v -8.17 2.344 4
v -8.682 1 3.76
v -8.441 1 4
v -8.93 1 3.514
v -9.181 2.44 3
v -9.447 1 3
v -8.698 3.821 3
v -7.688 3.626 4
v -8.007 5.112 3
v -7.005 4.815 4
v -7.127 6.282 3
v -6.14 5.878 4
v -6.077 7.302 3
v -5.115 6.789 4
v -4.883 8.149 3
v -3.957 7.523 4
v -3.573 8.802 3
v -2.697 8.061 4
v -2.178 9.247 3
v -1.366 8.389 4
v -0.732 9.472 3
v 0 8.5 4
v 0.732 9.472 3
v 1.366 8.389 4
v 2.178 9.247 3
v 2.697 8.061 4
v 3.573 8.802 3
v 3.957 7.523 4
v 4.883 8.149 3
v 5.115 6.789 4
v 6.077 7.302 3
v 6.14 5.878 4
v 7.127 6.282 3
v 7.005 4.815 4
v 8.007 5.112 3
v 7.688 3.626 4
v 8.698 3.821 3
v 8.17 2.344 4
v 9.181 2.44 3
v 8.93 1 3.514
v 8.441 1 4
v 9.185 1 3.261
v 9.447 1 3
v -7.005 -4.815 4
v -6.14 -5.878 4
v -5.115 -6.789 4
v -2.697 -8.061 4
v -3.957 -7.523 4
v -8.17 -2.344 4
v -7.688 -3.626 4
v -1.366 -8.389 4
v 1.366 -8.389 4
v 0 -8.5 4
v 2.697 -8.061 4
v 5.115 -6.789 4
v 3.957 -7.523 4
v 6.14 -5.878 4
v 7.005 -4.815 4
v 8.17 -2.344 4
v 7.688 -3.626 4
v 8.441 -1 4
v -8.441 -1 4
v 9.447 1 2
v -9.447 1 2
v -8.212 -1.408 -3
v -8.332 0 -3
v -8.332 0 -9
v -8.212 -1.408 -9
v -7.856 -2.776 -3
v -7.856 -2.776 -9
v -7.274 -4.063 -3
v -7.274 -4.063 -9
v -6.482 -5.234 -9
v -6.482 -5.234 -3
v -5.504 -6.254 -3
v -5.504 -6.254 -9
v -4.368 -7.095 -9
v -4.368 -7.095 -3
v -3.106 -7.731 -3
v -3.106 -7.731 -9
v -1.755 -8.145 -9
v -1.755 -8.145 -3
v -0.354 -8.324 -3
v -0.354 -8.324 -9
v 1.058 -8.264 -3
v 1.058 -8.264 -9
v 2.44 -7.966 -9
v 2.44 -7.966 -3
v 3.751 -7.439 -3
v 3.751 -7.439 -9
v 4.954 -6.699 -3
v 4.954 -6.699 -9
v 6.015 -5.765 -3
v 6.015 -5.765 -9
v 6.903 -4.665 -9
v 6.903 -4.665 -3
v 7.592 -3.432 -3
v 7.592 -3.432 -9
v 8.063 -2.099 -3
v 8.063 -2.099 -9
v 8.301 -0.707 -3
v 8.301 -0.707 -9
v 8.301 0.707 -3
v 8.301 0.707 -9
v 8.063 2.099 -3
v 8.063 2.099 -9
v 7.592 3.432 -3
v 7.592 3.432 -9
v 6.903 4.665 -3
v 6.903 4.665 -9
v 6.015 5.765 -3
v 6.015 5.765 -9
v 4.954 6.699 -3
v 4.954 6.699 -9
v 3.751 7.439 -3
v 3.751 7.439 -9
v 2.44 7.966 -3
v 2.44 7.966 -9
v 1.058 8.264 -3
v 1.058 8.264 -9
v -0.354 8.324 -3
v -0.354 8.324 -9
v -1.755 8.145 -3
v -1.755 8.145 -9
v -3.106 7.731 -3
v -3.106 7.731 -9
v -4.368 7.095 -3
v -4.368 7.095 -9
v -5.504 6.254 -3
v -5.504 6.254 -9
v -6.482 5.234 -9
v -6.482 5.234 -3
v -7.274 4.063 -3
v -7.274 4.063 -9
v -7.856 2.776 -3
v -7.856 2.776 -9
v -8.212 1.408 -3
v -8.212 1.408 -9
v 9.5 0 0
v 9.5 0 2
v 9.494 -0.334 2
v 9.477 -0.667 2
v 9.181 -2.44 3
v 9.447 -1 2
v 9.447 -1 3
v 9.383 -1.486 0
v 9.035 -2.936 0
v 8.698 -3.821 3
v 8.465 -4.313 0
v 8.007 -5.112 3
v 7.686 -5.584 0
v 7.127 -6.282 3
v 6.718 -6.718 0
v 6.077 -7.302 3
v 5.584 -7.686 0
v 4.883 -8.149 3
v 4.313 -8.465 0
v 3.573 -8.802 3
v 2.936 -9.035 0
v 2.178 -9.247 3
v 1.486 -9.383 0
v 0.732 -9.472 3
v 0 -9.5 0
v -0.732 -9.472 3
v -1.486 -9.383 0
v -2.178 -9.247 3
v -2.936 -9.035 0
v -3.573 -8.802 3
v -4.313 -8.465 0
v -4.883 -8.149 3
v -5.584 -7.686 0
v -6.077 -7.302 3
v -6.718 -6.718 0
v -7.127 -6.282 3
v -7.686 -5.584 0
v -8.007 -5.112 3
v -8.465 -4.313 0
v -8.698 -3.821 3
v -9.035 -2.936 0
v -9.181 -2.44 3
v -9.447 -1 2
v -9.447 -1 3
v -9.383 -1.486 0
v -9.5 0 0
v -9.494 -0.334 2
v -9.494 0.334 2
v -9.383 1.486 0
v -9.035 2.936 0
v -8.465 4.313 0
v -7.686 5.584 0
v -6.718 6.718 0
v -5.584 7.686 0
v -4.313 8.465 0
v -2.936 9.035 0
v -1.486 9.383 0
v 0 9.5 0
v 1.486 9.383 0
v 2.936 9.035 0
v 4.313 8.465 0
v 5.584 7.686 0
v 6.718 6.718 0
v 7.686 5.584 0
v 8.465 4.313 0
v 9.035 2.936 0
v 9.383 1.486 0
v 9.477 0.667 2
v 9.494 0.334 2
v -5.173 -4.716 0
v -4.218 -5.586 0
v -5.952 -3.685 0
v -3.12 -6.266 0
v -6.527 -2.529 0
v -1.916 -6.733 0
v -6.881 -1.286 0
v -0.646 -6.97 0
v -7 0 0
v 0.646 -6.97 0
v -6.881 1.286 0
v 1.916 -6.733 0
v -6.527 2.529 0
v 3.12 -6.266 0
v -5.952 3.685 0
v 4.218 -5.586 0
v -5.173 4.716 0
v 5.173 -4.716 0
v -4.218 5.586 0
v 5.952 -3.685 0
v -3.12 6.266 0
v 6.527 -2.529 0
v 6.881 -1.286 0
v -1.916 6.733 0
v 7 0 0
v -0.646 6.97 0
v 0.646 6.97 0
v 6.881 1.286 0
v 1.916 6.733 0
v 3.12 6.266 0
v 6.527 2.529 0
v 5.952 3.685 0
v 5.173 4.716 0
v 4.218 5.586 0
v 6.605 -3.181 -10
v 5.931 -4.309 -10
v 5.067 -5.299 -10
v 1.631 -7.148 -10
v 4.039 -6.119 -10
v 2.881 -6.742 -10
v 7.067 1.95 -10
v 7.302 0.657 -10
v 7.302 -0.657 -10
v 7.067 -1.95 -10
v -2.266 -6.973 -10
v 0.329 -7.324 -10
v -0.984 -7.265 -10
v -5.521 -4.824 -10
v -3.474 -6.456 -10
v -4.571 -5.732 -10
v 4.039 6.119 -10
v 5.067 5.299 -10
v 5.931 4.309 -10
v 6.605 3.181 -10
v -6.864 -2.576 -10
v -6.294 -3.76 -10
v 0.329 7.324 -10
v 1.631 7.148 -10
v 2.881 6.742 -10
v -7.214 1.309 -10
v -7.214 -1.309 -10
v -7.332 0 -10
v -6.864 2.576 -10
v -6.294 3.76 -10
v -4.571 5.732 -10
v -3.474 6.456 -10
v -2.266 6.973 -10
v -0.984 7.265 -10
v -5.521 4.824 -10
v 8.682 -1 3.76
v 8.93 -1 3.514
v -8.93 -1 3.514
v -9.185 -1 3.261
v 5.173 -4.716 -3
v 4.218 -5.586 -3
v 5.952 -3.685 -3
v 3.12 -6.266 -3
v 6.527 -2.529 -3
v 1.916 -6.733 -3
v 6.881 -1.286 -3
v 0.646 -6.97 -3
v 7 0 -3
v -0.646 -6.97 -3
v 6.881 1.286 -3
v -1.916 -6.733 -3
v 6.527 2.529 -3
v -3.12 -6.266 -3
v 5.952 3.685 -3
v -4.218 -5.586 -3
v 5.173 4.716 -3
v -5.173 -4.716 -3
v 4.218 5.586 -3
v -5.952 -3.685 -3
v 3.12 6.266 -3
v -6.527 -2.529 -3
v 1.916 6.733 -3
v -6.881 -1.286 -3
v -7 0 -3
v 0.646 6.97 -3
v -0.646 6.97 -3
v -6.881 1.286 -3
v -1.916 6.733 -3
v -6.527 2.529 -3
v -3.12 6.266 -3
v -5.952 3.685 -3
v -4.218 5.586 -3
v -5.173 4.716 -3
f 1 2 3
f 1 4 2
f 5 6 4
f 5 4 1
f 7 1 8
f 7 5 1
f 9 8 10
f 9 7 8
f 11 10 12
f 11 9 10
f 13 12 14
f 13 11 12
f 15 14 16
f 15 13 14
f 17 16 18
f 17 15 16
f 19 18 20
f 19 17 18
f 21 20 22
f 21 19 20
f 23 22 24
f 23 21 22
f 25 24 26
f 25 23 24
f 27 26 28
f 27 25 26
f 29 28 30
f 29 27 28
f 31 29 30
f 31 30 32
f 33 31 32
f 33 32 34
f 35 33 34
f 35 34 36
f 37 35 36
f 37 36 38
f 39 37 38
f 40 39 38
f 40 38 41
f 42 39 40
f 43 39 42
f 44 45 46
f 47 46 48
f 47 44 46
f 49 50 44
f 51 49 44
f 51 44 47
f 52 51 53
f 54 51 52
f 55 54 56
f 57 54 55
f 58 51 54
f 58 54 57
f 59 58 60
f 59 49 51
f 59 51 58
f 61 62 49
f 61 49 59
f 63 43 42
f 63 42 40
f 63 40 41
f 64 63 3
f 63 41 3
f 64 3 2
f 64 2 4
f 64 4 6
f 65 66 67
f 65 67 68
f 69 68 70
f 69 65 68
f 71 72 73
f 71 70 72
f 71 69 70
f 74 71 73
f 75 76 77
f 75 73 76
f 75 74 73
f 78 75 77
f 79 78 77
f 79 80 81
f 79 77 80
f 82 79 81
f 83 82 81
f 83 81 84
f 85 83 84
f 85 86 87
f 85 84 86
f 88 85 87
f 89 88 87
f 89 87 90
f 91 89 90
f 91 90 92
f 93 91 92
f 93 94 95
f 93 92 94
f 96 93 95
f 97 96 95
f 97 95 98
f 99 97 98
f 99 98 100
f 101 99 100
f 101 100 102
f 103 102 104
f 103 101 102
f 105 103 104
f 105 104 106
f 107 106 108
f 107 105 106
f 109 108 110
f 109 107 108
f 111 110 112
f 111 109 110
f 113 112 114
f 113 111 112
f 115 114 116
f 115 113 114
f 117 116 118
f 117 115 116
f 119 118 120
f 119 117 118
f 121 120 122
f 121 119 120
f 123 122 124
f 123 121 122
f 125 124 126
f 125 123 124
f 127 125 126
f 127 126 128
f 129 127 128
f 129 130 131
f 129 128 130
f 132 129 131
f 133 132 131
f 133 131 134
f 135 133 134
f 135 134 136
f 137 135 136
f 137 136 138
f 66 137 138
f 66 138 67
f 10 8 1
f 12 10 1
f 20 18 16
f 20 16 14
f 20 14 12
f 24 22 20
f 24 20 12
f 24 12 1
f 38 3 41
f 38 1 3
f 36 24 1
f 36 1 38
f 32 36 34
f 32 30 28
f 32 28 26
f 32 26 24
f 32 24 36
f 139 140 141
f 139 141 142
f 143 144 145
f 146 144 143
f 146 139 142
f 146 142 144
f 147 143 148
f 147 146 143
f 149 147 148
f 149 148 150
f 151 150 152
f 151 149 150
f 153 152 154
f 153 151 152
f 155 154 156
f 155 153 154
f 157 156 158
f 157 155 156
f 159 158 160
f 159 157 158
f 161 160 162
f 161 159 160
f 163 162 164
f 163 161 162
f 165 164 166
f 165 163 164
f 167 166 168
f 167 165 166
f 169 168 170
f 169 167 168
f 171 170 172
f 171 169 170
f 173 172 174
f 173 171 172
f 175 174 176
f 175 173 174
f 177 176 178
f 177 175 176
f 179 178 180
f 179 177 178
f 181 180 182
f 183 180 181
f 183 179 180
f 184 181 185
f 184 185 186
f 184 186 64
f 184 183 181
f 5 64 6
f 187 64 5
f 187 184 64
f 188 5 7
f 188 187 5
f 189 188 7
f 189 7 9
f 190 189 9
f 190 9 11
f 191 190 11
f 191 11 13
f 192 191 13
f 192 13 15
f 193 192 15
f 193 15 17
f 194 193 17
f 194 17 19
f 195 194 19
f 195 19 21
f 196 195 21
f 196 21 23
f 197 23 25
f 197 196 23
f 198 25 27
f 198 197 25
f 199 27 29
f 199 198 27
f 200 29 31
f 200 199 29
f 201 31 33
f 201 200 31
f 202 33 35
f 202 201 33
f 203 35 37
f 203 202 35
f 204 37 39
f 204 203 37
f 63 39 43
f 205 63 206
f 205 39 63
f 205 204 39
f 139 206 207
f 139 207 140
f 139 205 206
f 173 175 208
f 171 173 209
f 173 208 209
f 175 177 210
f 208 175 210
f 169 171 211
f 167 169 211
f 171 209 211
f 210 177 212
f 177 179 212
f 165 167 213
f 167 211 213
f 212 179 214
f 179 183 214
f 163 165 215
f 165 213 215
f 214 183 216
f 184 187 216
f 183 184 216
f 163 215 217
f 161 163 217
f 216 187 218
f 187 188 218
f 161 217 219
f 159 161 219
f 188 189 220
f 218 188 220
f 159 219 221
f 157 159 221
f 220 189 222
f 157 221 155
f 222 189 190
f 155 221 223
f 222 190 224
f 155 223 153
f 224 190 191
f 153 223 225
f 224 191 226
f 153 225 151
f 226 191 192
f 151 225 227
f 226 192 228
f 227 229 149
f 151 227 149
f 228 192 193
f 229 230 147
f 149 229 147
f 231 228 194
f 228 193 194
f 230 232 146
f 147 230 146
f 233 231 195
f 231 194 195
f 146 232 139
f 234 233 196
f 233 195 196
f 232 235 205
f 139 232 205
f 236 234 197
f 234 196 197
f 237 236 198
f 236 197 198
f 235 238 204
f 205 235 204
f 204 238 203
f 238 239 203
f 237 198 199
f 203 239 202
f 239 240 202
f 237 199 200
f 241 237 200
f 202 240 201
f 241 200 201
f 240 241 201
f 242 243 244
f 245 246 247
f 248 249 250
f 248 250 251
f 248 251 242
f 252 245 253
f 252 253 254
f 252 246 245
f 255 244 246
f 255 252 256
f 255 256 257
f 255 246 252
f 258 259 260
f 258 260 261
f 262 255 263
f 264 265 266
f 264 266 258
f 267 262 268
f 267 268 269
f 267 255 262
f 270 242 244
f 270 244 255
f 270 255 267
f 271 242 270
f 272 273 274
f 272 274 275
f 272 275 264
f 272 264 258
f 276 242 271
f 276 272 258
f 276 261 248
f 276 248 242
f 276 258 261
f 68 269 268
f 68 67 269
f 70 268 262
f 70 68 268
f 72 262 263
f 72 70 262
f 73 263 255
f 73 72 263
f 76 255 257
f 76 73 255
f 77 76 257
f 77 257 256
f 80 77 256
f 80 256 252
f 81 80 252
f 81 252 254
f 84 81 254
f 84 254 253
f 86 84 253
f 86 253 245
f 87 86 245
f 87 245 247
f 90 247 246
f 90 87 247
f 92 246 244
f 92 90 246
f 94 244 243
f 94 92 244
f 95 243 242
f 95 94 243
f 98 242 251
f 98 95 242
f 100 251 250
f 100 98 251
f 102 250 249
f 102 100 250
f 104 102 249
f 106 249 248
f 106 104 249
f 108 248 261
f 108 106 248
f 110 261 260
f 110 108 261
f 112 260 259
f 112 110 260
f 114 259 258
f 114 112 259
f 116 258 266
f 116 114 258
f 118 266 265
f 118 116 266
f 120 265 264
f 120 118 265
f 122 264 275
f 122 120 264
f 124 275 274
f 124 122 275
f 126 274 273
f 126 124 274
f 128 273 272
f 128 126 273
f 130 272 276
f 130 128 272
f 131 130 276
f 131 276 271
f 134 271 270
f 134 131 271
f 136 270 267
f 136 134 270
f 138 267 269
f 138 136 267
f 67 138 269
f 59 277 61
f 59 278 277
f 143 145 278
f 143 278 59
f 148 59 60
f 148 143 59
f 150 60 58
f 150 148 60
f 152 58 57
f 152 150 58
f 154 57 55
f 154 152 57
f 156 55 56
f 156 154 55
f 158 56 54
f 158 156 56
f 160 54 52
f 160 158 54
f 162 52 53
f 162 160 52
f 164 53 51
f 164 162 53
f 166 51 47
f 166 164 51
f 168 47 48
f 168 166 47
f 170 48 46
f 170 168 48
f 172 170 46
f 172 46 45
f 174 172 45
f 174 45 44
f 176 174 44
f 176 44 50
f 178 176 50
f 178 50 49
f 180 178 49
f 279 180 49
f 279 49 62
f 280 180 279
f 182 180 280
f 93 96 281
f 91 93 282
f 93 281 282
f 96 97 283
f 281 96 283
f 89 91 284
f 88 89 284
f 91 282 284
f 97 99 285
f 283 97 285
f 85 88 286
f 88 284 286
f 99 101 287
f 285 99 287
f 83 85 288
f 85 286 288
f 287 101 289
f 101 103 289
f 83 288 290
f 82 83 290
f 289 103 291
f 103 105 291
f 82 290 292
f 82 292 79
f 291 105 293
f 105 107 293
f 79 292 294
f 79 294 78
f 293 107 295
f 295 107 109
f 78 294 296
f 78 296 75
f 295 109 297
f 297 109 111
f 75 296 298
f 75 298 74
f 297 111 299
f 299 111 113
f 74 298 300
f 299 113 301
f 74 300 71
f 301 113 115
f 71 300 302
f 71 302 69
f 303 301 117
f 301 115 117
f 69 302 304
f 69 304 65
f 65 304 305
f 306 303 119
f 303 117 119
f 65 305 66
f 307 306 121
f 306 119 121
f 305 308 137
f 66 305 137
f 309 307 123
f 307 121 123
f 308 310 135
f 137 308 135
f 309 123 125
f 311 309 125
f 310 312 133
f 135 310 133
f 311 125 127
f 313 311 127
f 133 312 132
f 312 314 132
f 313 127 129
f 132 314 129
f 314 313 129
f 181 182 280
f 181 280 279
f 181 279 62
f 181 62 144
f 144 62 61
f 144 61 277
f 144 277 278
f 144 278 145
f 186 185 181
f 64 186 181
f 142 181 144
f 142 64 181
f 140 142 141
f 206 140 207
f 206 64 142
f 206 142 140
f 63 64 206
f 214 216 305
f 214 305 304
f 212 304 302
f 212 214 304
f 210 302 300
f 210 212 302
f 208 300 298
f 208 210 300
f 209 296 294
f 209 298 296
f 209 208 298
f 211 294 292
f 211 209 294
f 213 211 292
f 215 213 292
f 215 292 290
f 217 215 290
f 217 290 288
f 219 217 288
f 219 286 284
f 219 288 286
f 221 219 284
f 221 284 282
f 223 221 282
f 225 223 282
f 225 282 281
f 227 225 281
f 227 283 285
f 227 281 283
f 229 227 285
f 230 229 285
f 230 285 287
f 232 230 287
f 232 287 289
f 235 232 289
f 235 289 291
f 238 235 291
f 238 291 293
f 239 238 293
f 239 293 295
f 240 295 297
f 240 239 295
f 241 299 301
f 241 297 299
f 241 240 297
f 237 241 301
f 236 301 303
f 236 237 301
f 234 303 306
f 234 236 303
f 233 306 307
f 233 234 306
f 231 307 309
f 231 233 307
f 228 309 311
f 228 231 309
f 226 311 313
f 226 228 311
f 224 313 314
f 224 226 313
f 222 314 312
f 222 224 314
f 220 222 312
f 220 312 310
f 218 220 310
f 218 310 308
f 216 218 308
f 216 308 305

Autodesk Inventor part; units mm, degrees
ref_plane "YZ Plane" through (0, 0, 0) normal (1, 0, 0) x (0, 1, 0)
ref_plane "XZ Plane" through (0, 0, 0) normal (0, 1, 0) x (-1, 0, 0)
ref_plane "XY Plane" through (0, 0, 0) normal (0, 0, 1) x (1, 0, 0)
sketch "草图1" plane through (0, 0, 0) normal (0, 0, 1) x (1, 0, 0)
  circle A0 centre (0, 0) radius 9.5
  dimension "d0" = 19
extrude "拉伸1" add sketch "草图1" along normal blind 4
sketch "草图2" plane through (0, 0, 0) normal (0, 0, -1) x (-1, 0, 0)
  circle A0 centre (0, 0) radius 9.5 projected
  circle A1 centre (0, 0) radius 7
  dimension "d3" = 14
extrude "拉伸2" add sketch "草图2" along normal blind 3 contours A1
sketch "草图3" plane through (0, 0, -3) normal (0, 0, -1) x (-1, 0, 0)
  circle A0 centre (0, 0) radius 7 projected
  circle A1 centre (0, 0) radius 8.3315
  dimension "d6" = 14
  dimension "d7" = 16.663
extrude "拉伸3" add sketch "草图3" along normal blind 7 contours A0 | A1
thread "螺纹1" size "G16.662x1.337" designation "G 3/8" class "A" standard "GB Pipe Threads without seal" length 22
chamfer "倒角1" distance 1 angle 45 2 edges at (8.3315, 0, -10) (-9.5, 0, 4)
sketch "草图4" plane through (0, 0, 4) normal (0, 0, 1) x (1, 0, 0)
  circle A0 centre (0, 0) radius 8.5 projected
  line L0 (0, 0) -> (0, 1)
  line L1 (0, 1) -> (21.5358, 1)
  line L2 (21.5358, 1) -> (-22.0631, 1)
  line L3 (-22.0631, 1) -> (-22.0631, -1)
  line L4 (-22.0631, -1) -> (21.5358, -1)
  line L5 (21.5358, -1) -> (21.5358, 1)
  dimension "d15" = 1
  dimension "d16" = 2
extrude "拉伸4" cut sketch "草图4" against normal blind 2 contours A0 L4 L2 L1 | A0 L1 L5 L4 | A0 L4 L3 L2
properties part number "螺塞" material "钢 AISI 1018 106 HR"
